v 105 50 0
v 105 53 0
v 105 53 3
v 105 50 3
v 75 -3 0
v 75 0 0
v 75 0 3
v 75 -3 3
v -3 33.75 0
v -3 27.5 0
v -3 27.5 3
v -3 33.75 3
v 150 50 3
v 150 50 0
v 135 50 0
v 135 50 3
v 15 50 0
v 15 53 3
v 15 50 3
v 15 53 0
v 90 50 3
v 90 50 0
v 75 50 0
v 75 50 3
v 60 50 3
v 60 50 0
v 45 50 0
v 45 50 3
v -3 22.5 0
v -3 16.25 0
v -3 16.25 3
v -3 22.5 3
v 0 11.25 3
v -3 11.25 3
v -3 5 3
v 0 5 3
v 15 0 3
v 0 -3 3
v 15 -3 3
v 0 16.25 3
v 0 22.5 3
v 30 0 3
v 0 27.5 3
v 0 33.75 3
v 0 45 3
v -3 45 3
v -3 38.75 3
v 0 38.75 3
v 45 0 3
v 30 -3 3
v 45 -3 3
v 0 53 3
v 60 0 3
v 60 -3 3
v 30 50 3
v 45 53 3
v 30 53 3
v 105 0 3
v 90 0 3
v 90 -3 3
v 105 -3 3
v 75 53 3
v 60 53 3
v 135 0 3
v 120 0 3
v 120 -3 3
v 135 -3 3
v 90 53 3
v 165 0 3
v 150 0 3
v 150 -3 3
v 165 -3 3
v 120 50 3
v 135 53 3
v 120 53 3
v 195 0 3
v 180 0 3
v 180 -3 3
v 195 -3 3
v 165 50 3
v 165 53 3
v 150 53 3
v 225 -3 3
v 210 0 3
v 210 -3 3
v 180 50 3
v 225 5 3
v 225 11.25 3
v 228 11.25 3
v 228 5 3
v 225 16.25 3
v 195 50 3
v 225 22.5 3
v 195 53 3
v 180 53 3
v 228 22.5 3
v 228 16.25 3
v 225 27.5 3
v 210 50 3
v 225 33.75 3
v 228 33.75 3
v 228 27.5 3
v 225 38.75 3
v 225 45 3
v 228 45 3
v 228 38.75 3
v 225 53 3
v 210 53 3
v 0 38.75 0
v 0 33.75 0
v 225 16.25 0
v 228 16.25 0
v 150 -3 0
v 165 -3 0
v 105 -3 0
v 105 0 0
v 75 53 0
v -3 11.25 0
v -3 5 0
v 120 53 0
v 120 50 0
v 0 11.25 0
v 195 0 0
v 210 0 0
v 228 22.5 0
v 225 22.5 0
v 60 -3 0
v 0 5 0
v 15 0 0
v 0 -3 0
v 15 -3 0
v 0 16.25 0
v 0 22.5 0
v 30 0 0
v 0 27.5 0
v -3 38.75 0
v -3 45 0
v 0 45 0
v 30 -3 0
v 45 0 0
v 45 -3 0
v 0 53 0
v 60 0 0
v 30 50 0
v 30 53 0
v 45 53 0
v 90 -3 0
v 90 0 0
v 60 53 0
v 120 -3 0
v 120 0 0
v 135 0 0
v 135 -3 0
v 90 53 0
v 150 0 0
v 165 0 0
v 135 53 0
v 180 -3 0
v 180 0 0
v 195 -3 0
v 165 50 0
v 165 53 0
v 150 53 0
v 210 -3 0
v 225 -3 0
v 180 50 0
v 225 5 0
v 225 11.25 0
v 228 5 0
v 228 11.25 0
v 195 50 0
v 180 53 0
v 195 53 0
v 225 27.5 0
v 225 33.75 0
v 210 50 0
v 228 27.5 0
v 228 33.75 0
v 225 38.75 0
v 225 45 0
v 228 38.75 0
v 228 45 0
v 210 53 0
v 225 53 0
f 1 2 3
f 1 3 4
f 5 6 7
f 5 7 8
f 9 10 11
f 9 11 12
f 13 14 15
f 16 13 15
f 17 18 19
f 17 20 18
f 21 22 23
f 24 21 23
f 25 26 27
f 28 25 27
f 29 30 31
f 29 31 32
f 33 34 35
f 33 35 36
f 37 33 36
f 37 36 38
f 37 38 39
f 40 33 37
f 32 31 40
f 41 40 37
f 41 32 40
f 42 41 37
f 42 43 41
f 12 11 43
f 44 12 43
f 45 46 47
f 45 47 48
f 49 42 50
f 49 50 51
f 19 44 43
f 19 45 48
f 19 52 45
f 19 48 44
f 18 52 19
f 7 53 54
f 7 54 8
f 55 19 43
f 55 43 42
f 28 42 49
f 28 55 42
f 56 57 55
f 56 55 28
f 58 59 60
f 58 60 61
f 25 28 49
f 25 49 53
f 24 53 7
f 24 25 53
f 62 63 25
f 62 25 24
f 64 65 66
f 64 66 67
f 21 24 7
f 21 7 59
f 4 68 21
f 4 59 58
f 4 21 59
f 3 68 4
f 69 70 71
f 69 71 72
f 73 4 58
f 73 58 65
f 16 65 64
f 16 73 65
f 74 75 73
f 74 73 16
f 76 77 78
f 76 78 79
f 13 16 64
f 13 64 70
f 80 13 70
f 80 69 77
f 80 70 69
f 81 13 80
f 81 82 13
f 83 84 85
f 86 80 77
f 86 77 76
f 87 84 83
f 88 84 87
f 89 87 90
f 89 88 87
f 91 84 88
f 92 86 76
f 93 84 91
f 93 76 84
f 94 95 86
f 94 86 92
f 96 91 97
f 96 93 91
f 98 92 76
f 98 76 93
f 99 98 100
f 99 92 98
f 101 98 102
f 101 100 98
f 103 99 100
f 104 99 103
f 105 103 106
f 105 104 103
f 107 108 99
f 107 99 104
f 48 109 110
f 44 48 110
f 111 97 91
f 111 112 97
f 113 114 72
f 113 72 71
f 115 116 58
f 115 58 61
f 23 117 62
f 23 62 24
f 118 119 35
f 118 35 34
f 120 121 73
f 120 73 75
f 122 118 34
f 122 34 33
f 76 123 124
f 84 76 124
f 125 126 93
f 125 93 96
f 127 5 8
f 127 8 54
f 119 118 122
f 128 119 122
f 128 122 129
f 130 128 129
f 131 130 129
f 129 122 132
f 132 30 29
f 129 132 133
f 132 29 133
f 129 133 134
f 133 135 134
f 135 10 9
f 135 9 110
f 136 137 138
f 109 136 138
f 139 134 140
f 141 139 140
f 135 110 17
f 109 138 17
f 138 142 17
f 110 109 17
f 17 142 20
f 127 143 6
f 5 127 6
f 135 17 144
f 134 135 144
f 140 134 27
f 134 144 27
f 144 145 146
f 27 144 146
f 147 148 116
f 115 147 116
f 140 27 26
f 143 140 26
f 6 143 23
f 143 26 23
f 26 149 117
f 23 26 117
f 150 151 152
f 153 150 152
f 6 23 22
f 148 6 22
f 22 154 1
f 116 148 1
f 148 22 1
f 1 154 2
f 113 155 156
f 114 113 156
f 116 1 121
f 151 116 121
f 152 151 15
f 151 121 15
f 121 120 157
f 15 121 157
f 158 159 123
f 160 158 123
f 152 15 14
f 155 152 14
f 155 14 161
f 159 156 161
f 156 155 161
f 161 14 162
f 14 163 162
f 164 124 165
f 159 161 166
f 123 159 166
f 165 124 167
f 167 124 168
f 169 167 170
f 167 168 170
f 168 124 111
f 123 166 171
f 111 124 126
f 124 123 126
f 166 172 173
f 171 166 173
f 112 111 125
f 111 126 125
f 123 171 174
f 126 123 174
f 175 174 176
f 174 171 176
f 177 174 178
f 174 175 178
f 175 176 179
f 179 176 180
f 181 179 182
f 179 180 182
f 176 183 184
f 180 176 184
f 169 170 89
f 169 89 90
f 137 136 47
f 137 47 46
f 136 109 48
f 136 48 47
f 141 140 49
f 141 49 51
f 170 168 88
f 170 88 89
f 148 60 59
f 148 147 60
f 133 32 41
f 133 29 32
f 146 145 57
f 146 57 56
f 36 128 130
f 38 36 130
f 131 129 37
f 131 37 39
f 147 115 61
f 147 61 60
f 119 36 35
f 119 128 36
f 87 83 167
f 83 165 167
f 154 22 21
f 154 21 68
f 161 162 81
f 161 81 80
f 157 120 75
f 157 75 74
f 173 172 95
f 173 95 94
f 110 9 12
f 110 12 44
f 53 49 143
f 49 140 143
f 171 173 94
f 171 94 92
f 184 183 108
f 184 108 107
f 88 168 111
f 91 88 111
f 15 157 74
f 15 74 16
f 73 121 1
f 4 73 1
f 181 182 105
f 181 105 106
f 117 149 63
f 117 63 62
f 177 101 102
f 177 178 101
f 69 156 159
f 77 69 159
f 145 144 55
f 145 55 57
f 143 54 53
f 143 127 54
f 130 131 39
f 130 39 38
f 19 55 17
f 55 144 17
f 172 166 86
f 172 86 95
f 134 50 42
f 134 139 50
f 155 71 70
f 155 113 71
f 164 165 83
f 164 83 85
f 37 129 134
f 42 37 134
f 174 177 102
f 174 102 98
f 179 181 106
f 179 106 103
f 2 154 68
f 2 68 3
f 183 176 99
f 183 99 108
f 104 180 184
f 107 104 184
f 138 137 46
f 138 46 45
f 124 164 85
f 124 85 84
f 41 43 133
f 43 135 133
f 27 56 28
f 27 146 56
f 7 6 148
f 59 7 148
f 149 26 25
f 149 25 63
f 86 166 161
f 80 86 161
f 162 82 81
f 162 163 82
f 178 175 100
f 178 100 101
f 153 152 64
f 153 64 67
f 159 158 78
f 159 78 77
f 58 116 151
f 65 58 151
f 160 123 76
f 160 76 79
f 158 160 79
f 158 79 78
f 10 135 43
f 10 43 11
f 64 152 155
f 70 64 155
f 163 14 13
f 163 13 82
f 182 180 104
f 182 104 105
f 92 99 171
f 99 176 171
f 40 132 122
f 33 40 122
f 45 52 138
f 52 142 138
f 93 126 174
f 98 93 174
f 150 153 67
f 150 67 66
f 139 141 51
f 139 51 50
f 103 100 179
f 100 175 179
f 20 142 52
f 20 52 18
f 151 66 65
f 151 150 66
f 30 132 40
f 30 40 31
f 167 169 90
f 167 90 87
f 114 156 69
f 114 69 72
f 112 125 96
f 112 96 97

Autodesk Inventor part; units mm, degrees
ref_plane "YZ Plane" through (0, 0, 0) normal (1, 0, 0) x (0, 1, 0)
ref_plane "XZ Plane" through (0, 0, 0) normal (0, 1, 0) x (-1, 0, 0)
ref_plane "XY Plane" through (0, 0, 0) normal (0, 0, 1) x (1, 0, 0)
sketch "Sketch1" plane through (0, 0, 0) normal (0, 0, 1) x (1, 0, 0)
  line L0 (0, 0) -> (225, 0)
  line L1 (225, 0) -> (225, 50)
  line L2 (225, 50) -> (0, 50)
  line L3 (0, 50) -> (0, 0)
  line L4 (-3, 45) -> (0, 45)
  line L5 (0, 45) -> (0, 38.75)
  line L6 (0, 38.75) -> (-3, 38.75)
  line L7 (-3, 38.75) -> (-3, 45)
  line L8 (0, 0) -> (15, 0)
  line L9 (15, 0) -> (15, -3)
  line L10 (15, -3) -> (0, -3)
  line L11 (0, -3) -> (0, 0)
  line L12 (-3, 33.75) -> (0, 33.75)
  line L13 (0, 33.75) -> (0, 27.5)
  line L14 (-3, 27.5) -> (-3, 33.75)
  line L15 (0, 27.5) -> (-3, 27.5)
  line L16 (-3, 22.5) -> (0, 22.5)
  line L17 (0, 22.5) -> (0, 16.25)
  line L18 (-3, 16.25) -> (-3, 22.5)
  line L19 (0, 16.25) -> (-3, 16.25)
  line L20 (-3, 11.25) -> (0, 11.25)
  line L21 (0, 11.25) -> (0, 5)
  line L22 (-3, 5) -> (-3, 11.25)
  line L23 (0, 5) -> (-3, 5)
  line L24 (225, 45) -> (228, 45)
  line L25 (228, 45) -> (228, 38.75)
  line L26 (225, 38.75) -> (225, 45)
  line L27 (228, 38.75) -> (225, 38.75)
  line L28 (225, 33.75) -> (228, 33.75)
  line L29 (228, 33.75) -> (228, 27.5)
  line L30 (225, 27.5) -> (225, 33.75)
  line L31 (228, 27.5) -> (225, 27.5)
  line L32 (225, 22.5) -> (228, 22.5)
  line L33 (228, 22.5) -> (228, 16.25)
  line L34 (225, 16.25) -> (225, 22.5)
  line L35 (228, 16.25) -> (225, 16.25)
  line L36 (225, 11.25) -> (228, 11.25)
  line L37 (228, 11.25) -> (228, 5)
  line L38 (225, 5) -> (225, 11.25)
  line L39 (228, 5) -> (225, 5)
  line L40 (45, -3) -> (30, -3)
  line L41 (30, -3) -> (30, 0)
  line L42 (45, 0) -> (45, -3)
  line L43 (30, 0) -> (45, 0)
  line L44 (75, -3) -> (60, -3)
  line L45 (60, -3) -> (60, 0)
  line L46 (75, 0) -> (75, -3)
  line L47 (60, 0) -> (75, 0)
  line L48 (105, -3) -> (90, -3)
  line L49 (90, -3) -> (90, 0)
  line L50 (105, 0) -> (105, -3)
  line L51 (90, 0) -> (105, 0)
  line L52 (135, -3) -> (120, -3)
  line L53 (120, -3) -> (120, 0)
  line L54 (135, 0) -> (135, -3)
  line L55 (120, 0) -> (135, 0)
  line L56 (165, -3) -> (150, -3)
  line L57 (150, -3) -> (150, 0)
  line L58 (165, 0) -> (165, -3)
  line L59 (150, 0) -> (165, 0)
  line L60 (195, -3) -> (180, -3)
  line L61 (180, -3) -> (180, 0)
  line L62 (195, 0) -> (195, -3)
  line L63 (180, 0) -> (195, 0)
  line L64 (225, -3) -> (210, -3)
  line L65 (210, -3) -> (210, 0)
  line L66 (225, 0) -> (225, -3)
  line L67 (210, 0) -> (225, 0)
  line L68 (15, 50) -> (0, 50)
  line L69 (0, 50) -> (0, 53)
  line L70 (15, 53) -> (15, 50)
  line L71 (0, 53) -> (15, 53)
  line L72 (45, 50) -> (30, 50)
  line L73 (30, 50) -> (30, 53)
  line L74 (45, 53) -> (45, 50)
  line L75 (30, 53) -> (45, 53)
  line L76 (75, 50) -> (60, 50)
  line L77 (60, 50) -> (60, 53)
  line L78 (75, 53) -> (75, 50)
  line L79 (60, 53) -> (75, 53)
  line L80 (105, 50) -> (90, 50)
  line L81 (90, 50) -> (90, 53)
  line L82 (105, 53) -> (105, 50)
  line L83 (90, 53) -> (105, 53)
  line L84 (135, 50) -> (120, 50)
  line L85 (120, 50) -> (120, 53)
  line L86 (135, 53) -> (135, 50)
  line L87 (120, 53) -> (135, 53)
  line L88 (165, 50) -> (150, 50)
  line L89 (150, 50) -> (150, 53)
  line L90 (165, 53) -> (165, 50)
  line L91 (150, 53) -> (165, 53)
  line L92 (195, 50) -> (180, 50)
  line L93 (180, 50) -> (180, 53)
  line L94 (195, 53) -> (195, 50)
  line L95 (180, 53) -> (195, 53)
  line L96 (225, 50) -> (210, 50)
  line L97 (210, 50) -> (210, 53)
  line L98 (225, 53) -> (225, 50)
  line L99 (210, 53) -> (225, 53)
  point P0 (0, 38.75)
  point P1 (0, 50)
  dimension "d0" = 225
  dimension "d1" = 50
  dimension "d4" = 6.25
  dimension "d5" = 3
  dimension "d6" = 5
  dimension "d7" = 15
  dimension "d8" = 3
  dimension "d13" = 11.25
  dimension "d16" = 228
  dimension "d21" = 30
  dimension "d24" = 53
extrude "Extrusion1" add sketch "Sketch1" along normal blind 3 contours L3 L2 L1 L0 | L23 L22 L20 L3 | L19 L18 L16 L3 | L15 L14 L12 L3 | L6 L7 L4 L3 | L1 L36 L37 L39 | L1 L32 L33 L35 | L1 L28 L29 L31 | L1 L24 L25 L27
extrude "Extrusion2" add sketch "Sketch1" along normal blind 3 contours L0 L9 L10 L11 | L0 L42 L40 L41 | L0 L46 L44 L45 | L0 L50 L48 L49 | L0 L54 L52 L53 | L69 L71 L70 L2 | L0 L58 L56 L57 | L73 L75 L74 L2 | L0 L62 L60 L61 | L77 L79 L78 L2 | L0 L66 L64 L65 | L81 L83 L82 L2 | L85 L87 L86 L2 | L89 L91 L90 L2 | L93 L95 L94 L2 | L97 L99 L98 L2
properties part number "AnchoBase"
